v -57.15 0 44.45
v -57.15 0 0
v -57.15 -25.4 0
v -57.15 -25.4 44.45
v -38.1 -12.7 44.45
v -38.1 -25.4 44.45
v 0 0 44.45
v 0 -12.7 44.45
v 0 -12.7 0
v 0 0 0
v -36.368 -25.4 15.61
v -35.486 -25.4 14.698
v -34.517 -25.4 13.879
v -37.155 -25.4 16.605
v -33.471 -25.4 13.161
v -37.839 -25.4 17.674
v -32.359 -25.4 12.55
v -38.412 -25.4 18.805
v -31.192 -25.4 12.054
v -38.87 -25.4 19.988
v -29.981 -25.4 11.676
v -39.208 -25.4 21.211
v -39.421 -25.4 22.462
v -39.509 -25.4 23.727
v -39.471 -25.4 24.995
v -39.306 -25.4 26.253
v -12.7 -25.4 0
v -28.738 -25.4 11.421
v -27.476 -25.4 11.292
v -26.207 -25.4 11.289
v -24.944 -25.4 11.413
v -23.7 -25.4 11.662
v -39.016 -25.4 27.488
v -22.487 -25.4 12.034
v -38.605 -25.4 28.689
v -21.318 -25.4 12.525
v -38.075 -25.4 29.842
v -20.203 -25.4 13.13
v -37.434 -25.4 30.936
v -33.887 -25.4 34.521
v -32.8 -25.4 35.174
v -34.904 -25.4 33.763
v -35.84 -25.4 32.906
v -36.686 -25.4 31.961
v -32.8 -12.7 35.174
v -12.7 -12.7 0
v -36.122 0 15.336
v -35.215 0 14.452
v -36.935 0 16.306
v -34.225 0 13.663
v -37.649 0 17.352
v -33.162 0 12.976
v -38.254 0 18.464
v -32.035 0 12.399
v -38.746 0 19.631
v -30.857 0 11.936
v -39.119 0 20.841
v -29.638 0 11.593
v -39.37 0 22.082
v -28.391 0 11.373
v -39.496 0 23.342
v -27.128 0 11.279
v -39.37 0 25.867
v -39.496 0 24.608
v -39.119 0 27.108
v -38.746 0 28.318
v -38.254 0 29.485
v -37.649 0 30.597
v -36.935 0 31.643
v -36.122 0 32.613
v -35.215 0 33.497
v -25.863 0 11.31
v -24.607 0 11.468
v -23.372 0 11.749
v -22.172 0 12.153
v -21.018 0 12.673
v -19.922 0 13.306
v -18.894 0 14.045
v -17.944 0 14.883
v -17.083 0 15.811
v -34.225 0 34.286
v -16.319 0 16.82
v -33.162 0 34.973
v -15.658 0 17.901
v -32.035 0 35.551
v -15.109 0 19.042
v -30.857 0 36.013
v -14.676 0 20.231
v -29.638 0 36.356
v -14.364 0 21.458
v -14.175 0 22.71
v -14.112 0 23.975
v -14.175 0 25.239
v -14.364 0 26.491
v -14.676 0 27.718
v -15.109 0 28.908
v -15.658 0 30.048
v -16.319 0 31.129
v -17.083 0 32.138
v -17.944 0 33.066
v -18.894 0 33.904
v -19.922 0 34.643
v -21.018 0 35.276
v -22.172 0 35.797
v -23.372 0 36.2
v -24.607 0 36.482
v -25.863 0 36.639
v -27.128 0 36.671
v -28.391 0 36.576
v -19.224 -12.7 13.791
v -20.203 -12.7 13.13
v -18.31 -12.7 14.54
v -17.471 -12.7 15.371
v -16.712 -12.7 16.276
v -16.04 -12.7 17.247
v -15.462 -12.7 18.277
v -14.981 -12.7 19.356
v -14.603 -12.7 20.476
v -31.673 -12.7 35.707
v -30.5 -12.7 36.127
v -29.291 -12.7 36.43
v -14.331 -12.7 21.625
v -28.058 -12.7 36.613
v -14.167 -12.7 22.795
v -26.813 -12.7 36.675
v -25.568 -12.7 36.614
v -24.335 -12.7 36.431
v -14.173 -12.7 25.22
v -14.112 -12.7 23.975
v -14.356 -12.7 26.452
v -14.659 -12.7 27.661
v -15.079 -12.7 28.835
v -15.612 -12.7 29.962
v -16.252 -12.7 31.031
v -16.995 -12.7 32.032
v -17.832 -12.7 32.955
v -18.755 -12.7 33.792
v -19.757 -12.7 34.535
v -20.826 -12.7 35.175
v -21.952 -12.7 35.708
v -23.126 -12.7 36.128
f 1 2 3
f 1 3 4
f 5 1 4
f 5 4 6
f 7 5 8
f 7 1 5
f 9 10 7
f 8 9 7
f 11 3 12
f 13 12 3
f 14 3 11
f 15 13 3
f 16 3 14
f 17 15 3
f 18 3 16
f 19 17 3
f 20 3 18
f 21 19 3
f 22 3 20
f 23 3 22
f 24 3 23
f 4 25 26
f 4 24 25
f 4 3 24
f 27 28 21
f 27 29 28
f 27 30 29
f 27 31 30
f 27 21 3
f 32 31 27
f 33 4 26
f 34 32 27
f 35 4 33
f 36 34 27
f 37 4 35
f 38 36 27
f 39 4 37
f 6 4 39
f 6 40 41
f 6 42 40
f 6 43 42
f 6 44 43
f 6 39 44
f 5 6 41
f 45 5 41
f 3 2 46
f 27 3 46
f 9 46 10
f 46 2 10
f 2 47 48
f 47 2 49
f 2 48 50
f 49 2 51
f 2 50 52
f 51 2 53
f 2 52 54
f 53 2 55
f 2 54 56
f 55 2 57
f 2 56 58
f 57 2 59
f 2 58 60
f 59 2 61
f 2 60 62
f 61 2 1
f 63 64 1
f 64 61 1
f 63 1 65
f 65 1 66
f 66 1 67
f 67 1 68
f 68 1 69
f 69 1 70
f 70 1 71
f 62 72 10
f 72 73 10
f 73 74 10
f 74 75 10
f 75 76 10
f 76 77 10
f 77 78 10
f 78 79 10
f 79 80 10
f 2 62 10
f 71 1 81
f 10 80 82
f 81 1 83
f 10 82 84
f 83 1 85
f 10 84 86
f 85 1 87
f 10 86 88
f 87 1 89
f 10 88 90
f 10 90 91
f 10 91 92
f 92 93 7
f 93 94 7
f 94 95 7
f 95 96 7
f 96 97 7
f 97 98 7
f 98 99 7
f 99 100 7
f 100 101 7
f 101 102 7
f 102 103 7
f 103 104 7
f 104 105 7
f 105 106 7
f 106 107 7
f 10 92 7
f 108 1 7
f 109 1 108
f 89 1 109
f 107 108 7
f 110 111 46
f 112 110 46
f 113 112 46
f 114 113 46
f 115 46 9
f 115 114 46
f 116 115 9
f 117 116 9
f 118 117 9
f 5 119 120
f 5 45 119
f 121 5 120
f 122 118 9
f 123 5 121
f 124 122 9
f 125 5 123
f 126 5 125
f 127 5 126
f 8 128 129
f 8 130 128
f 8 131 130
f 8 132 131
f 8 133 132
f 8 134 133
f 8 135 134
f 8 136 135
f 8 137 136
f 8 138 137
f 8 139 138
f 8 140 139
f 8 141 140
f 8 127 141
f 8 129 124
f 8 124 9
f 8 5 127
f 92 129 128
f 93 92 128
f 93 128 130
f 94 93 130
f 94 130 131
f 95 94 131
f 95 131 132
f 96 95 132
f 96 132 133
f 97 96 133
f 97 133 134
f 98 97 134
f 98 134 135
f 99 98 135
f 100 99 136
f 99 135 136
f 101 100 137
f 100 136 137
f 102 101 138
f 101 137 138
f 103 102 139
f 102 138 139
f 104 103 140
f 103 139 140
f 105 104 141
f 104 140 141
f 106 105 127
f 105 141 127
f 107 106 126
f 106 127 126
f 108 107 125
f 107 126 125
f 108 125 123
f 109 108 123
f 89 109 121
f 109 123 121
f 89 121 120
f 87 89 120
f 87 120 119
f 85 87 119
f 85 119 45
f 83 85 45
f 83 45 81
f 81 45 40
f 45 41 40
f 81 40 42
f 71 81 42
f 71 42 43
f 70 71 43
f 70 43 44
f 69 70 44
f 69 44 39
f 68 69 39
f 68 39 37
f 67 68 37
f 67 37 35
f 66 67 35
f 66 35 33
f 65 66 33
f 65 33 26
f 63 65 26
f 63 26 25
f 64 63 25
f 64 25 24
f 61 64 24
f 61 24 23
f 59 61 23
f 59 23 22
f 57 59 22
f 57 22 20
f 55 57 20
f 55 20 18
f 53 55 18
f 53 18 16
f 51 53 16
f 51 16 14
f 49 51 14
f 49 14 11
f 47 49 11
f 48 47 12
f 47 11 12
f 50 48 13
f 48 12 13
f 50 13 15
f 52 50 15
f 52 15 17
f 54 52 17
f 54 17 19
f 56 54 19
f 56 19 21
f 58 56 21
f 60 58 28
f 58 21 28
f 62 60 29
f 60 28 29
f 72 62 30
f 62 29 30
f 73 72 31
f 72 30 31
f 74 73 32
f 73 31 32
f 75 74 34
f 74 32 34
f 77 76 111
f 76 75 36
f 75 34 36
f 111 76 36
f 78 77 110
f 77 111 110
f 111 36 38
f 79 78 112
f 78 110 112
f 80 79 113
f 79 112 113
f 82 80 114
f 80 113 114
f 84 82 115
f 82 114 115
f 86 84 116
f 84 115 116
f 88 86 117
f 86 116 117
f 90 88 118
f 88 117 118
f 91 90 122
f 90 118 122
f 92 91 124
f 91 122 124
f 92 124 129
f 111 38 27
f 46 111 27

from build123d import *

# Parameters (mm, degrees)
F0_W     = 57.15
F0_H     = 44.45
F1_DEPTH = 25.4
F3_R     = 12.7
F4_DEPTH = 25.401
F5_DEPTH = 12.7


with BuildPart() as f1:
    # F0 (on Front) → F1 (new body)
    with BuildSketch(Plane.XZ):
        with Locations((-28.575, 22.225)):
            Rectangle(F0_W, F0_H)
    extrude(amount=F1_DEPTH)

    # F3 (on face) → F4 (cut, through all)
    with BuildSketch(Plane.XZ.offset(25.4)):
        with Locations((-26.811862, 23.974629)):
            Circle(F3_R)
    extrude(amount=-F4_DEPTH, mode=Mode.SUBTRACT)

    # F2 (on face) → F5 (cut)
    with BuildSketch(Plane.XZ.offset(25.4)):
        Polygon((0, 44.45), (-38.1, 44.45), (-12.7, 0), (0, 0), align=None)
    extrude(amount=-F5_DEPTH, mode=Mode.SUBTRACT)


solid = f1.part
